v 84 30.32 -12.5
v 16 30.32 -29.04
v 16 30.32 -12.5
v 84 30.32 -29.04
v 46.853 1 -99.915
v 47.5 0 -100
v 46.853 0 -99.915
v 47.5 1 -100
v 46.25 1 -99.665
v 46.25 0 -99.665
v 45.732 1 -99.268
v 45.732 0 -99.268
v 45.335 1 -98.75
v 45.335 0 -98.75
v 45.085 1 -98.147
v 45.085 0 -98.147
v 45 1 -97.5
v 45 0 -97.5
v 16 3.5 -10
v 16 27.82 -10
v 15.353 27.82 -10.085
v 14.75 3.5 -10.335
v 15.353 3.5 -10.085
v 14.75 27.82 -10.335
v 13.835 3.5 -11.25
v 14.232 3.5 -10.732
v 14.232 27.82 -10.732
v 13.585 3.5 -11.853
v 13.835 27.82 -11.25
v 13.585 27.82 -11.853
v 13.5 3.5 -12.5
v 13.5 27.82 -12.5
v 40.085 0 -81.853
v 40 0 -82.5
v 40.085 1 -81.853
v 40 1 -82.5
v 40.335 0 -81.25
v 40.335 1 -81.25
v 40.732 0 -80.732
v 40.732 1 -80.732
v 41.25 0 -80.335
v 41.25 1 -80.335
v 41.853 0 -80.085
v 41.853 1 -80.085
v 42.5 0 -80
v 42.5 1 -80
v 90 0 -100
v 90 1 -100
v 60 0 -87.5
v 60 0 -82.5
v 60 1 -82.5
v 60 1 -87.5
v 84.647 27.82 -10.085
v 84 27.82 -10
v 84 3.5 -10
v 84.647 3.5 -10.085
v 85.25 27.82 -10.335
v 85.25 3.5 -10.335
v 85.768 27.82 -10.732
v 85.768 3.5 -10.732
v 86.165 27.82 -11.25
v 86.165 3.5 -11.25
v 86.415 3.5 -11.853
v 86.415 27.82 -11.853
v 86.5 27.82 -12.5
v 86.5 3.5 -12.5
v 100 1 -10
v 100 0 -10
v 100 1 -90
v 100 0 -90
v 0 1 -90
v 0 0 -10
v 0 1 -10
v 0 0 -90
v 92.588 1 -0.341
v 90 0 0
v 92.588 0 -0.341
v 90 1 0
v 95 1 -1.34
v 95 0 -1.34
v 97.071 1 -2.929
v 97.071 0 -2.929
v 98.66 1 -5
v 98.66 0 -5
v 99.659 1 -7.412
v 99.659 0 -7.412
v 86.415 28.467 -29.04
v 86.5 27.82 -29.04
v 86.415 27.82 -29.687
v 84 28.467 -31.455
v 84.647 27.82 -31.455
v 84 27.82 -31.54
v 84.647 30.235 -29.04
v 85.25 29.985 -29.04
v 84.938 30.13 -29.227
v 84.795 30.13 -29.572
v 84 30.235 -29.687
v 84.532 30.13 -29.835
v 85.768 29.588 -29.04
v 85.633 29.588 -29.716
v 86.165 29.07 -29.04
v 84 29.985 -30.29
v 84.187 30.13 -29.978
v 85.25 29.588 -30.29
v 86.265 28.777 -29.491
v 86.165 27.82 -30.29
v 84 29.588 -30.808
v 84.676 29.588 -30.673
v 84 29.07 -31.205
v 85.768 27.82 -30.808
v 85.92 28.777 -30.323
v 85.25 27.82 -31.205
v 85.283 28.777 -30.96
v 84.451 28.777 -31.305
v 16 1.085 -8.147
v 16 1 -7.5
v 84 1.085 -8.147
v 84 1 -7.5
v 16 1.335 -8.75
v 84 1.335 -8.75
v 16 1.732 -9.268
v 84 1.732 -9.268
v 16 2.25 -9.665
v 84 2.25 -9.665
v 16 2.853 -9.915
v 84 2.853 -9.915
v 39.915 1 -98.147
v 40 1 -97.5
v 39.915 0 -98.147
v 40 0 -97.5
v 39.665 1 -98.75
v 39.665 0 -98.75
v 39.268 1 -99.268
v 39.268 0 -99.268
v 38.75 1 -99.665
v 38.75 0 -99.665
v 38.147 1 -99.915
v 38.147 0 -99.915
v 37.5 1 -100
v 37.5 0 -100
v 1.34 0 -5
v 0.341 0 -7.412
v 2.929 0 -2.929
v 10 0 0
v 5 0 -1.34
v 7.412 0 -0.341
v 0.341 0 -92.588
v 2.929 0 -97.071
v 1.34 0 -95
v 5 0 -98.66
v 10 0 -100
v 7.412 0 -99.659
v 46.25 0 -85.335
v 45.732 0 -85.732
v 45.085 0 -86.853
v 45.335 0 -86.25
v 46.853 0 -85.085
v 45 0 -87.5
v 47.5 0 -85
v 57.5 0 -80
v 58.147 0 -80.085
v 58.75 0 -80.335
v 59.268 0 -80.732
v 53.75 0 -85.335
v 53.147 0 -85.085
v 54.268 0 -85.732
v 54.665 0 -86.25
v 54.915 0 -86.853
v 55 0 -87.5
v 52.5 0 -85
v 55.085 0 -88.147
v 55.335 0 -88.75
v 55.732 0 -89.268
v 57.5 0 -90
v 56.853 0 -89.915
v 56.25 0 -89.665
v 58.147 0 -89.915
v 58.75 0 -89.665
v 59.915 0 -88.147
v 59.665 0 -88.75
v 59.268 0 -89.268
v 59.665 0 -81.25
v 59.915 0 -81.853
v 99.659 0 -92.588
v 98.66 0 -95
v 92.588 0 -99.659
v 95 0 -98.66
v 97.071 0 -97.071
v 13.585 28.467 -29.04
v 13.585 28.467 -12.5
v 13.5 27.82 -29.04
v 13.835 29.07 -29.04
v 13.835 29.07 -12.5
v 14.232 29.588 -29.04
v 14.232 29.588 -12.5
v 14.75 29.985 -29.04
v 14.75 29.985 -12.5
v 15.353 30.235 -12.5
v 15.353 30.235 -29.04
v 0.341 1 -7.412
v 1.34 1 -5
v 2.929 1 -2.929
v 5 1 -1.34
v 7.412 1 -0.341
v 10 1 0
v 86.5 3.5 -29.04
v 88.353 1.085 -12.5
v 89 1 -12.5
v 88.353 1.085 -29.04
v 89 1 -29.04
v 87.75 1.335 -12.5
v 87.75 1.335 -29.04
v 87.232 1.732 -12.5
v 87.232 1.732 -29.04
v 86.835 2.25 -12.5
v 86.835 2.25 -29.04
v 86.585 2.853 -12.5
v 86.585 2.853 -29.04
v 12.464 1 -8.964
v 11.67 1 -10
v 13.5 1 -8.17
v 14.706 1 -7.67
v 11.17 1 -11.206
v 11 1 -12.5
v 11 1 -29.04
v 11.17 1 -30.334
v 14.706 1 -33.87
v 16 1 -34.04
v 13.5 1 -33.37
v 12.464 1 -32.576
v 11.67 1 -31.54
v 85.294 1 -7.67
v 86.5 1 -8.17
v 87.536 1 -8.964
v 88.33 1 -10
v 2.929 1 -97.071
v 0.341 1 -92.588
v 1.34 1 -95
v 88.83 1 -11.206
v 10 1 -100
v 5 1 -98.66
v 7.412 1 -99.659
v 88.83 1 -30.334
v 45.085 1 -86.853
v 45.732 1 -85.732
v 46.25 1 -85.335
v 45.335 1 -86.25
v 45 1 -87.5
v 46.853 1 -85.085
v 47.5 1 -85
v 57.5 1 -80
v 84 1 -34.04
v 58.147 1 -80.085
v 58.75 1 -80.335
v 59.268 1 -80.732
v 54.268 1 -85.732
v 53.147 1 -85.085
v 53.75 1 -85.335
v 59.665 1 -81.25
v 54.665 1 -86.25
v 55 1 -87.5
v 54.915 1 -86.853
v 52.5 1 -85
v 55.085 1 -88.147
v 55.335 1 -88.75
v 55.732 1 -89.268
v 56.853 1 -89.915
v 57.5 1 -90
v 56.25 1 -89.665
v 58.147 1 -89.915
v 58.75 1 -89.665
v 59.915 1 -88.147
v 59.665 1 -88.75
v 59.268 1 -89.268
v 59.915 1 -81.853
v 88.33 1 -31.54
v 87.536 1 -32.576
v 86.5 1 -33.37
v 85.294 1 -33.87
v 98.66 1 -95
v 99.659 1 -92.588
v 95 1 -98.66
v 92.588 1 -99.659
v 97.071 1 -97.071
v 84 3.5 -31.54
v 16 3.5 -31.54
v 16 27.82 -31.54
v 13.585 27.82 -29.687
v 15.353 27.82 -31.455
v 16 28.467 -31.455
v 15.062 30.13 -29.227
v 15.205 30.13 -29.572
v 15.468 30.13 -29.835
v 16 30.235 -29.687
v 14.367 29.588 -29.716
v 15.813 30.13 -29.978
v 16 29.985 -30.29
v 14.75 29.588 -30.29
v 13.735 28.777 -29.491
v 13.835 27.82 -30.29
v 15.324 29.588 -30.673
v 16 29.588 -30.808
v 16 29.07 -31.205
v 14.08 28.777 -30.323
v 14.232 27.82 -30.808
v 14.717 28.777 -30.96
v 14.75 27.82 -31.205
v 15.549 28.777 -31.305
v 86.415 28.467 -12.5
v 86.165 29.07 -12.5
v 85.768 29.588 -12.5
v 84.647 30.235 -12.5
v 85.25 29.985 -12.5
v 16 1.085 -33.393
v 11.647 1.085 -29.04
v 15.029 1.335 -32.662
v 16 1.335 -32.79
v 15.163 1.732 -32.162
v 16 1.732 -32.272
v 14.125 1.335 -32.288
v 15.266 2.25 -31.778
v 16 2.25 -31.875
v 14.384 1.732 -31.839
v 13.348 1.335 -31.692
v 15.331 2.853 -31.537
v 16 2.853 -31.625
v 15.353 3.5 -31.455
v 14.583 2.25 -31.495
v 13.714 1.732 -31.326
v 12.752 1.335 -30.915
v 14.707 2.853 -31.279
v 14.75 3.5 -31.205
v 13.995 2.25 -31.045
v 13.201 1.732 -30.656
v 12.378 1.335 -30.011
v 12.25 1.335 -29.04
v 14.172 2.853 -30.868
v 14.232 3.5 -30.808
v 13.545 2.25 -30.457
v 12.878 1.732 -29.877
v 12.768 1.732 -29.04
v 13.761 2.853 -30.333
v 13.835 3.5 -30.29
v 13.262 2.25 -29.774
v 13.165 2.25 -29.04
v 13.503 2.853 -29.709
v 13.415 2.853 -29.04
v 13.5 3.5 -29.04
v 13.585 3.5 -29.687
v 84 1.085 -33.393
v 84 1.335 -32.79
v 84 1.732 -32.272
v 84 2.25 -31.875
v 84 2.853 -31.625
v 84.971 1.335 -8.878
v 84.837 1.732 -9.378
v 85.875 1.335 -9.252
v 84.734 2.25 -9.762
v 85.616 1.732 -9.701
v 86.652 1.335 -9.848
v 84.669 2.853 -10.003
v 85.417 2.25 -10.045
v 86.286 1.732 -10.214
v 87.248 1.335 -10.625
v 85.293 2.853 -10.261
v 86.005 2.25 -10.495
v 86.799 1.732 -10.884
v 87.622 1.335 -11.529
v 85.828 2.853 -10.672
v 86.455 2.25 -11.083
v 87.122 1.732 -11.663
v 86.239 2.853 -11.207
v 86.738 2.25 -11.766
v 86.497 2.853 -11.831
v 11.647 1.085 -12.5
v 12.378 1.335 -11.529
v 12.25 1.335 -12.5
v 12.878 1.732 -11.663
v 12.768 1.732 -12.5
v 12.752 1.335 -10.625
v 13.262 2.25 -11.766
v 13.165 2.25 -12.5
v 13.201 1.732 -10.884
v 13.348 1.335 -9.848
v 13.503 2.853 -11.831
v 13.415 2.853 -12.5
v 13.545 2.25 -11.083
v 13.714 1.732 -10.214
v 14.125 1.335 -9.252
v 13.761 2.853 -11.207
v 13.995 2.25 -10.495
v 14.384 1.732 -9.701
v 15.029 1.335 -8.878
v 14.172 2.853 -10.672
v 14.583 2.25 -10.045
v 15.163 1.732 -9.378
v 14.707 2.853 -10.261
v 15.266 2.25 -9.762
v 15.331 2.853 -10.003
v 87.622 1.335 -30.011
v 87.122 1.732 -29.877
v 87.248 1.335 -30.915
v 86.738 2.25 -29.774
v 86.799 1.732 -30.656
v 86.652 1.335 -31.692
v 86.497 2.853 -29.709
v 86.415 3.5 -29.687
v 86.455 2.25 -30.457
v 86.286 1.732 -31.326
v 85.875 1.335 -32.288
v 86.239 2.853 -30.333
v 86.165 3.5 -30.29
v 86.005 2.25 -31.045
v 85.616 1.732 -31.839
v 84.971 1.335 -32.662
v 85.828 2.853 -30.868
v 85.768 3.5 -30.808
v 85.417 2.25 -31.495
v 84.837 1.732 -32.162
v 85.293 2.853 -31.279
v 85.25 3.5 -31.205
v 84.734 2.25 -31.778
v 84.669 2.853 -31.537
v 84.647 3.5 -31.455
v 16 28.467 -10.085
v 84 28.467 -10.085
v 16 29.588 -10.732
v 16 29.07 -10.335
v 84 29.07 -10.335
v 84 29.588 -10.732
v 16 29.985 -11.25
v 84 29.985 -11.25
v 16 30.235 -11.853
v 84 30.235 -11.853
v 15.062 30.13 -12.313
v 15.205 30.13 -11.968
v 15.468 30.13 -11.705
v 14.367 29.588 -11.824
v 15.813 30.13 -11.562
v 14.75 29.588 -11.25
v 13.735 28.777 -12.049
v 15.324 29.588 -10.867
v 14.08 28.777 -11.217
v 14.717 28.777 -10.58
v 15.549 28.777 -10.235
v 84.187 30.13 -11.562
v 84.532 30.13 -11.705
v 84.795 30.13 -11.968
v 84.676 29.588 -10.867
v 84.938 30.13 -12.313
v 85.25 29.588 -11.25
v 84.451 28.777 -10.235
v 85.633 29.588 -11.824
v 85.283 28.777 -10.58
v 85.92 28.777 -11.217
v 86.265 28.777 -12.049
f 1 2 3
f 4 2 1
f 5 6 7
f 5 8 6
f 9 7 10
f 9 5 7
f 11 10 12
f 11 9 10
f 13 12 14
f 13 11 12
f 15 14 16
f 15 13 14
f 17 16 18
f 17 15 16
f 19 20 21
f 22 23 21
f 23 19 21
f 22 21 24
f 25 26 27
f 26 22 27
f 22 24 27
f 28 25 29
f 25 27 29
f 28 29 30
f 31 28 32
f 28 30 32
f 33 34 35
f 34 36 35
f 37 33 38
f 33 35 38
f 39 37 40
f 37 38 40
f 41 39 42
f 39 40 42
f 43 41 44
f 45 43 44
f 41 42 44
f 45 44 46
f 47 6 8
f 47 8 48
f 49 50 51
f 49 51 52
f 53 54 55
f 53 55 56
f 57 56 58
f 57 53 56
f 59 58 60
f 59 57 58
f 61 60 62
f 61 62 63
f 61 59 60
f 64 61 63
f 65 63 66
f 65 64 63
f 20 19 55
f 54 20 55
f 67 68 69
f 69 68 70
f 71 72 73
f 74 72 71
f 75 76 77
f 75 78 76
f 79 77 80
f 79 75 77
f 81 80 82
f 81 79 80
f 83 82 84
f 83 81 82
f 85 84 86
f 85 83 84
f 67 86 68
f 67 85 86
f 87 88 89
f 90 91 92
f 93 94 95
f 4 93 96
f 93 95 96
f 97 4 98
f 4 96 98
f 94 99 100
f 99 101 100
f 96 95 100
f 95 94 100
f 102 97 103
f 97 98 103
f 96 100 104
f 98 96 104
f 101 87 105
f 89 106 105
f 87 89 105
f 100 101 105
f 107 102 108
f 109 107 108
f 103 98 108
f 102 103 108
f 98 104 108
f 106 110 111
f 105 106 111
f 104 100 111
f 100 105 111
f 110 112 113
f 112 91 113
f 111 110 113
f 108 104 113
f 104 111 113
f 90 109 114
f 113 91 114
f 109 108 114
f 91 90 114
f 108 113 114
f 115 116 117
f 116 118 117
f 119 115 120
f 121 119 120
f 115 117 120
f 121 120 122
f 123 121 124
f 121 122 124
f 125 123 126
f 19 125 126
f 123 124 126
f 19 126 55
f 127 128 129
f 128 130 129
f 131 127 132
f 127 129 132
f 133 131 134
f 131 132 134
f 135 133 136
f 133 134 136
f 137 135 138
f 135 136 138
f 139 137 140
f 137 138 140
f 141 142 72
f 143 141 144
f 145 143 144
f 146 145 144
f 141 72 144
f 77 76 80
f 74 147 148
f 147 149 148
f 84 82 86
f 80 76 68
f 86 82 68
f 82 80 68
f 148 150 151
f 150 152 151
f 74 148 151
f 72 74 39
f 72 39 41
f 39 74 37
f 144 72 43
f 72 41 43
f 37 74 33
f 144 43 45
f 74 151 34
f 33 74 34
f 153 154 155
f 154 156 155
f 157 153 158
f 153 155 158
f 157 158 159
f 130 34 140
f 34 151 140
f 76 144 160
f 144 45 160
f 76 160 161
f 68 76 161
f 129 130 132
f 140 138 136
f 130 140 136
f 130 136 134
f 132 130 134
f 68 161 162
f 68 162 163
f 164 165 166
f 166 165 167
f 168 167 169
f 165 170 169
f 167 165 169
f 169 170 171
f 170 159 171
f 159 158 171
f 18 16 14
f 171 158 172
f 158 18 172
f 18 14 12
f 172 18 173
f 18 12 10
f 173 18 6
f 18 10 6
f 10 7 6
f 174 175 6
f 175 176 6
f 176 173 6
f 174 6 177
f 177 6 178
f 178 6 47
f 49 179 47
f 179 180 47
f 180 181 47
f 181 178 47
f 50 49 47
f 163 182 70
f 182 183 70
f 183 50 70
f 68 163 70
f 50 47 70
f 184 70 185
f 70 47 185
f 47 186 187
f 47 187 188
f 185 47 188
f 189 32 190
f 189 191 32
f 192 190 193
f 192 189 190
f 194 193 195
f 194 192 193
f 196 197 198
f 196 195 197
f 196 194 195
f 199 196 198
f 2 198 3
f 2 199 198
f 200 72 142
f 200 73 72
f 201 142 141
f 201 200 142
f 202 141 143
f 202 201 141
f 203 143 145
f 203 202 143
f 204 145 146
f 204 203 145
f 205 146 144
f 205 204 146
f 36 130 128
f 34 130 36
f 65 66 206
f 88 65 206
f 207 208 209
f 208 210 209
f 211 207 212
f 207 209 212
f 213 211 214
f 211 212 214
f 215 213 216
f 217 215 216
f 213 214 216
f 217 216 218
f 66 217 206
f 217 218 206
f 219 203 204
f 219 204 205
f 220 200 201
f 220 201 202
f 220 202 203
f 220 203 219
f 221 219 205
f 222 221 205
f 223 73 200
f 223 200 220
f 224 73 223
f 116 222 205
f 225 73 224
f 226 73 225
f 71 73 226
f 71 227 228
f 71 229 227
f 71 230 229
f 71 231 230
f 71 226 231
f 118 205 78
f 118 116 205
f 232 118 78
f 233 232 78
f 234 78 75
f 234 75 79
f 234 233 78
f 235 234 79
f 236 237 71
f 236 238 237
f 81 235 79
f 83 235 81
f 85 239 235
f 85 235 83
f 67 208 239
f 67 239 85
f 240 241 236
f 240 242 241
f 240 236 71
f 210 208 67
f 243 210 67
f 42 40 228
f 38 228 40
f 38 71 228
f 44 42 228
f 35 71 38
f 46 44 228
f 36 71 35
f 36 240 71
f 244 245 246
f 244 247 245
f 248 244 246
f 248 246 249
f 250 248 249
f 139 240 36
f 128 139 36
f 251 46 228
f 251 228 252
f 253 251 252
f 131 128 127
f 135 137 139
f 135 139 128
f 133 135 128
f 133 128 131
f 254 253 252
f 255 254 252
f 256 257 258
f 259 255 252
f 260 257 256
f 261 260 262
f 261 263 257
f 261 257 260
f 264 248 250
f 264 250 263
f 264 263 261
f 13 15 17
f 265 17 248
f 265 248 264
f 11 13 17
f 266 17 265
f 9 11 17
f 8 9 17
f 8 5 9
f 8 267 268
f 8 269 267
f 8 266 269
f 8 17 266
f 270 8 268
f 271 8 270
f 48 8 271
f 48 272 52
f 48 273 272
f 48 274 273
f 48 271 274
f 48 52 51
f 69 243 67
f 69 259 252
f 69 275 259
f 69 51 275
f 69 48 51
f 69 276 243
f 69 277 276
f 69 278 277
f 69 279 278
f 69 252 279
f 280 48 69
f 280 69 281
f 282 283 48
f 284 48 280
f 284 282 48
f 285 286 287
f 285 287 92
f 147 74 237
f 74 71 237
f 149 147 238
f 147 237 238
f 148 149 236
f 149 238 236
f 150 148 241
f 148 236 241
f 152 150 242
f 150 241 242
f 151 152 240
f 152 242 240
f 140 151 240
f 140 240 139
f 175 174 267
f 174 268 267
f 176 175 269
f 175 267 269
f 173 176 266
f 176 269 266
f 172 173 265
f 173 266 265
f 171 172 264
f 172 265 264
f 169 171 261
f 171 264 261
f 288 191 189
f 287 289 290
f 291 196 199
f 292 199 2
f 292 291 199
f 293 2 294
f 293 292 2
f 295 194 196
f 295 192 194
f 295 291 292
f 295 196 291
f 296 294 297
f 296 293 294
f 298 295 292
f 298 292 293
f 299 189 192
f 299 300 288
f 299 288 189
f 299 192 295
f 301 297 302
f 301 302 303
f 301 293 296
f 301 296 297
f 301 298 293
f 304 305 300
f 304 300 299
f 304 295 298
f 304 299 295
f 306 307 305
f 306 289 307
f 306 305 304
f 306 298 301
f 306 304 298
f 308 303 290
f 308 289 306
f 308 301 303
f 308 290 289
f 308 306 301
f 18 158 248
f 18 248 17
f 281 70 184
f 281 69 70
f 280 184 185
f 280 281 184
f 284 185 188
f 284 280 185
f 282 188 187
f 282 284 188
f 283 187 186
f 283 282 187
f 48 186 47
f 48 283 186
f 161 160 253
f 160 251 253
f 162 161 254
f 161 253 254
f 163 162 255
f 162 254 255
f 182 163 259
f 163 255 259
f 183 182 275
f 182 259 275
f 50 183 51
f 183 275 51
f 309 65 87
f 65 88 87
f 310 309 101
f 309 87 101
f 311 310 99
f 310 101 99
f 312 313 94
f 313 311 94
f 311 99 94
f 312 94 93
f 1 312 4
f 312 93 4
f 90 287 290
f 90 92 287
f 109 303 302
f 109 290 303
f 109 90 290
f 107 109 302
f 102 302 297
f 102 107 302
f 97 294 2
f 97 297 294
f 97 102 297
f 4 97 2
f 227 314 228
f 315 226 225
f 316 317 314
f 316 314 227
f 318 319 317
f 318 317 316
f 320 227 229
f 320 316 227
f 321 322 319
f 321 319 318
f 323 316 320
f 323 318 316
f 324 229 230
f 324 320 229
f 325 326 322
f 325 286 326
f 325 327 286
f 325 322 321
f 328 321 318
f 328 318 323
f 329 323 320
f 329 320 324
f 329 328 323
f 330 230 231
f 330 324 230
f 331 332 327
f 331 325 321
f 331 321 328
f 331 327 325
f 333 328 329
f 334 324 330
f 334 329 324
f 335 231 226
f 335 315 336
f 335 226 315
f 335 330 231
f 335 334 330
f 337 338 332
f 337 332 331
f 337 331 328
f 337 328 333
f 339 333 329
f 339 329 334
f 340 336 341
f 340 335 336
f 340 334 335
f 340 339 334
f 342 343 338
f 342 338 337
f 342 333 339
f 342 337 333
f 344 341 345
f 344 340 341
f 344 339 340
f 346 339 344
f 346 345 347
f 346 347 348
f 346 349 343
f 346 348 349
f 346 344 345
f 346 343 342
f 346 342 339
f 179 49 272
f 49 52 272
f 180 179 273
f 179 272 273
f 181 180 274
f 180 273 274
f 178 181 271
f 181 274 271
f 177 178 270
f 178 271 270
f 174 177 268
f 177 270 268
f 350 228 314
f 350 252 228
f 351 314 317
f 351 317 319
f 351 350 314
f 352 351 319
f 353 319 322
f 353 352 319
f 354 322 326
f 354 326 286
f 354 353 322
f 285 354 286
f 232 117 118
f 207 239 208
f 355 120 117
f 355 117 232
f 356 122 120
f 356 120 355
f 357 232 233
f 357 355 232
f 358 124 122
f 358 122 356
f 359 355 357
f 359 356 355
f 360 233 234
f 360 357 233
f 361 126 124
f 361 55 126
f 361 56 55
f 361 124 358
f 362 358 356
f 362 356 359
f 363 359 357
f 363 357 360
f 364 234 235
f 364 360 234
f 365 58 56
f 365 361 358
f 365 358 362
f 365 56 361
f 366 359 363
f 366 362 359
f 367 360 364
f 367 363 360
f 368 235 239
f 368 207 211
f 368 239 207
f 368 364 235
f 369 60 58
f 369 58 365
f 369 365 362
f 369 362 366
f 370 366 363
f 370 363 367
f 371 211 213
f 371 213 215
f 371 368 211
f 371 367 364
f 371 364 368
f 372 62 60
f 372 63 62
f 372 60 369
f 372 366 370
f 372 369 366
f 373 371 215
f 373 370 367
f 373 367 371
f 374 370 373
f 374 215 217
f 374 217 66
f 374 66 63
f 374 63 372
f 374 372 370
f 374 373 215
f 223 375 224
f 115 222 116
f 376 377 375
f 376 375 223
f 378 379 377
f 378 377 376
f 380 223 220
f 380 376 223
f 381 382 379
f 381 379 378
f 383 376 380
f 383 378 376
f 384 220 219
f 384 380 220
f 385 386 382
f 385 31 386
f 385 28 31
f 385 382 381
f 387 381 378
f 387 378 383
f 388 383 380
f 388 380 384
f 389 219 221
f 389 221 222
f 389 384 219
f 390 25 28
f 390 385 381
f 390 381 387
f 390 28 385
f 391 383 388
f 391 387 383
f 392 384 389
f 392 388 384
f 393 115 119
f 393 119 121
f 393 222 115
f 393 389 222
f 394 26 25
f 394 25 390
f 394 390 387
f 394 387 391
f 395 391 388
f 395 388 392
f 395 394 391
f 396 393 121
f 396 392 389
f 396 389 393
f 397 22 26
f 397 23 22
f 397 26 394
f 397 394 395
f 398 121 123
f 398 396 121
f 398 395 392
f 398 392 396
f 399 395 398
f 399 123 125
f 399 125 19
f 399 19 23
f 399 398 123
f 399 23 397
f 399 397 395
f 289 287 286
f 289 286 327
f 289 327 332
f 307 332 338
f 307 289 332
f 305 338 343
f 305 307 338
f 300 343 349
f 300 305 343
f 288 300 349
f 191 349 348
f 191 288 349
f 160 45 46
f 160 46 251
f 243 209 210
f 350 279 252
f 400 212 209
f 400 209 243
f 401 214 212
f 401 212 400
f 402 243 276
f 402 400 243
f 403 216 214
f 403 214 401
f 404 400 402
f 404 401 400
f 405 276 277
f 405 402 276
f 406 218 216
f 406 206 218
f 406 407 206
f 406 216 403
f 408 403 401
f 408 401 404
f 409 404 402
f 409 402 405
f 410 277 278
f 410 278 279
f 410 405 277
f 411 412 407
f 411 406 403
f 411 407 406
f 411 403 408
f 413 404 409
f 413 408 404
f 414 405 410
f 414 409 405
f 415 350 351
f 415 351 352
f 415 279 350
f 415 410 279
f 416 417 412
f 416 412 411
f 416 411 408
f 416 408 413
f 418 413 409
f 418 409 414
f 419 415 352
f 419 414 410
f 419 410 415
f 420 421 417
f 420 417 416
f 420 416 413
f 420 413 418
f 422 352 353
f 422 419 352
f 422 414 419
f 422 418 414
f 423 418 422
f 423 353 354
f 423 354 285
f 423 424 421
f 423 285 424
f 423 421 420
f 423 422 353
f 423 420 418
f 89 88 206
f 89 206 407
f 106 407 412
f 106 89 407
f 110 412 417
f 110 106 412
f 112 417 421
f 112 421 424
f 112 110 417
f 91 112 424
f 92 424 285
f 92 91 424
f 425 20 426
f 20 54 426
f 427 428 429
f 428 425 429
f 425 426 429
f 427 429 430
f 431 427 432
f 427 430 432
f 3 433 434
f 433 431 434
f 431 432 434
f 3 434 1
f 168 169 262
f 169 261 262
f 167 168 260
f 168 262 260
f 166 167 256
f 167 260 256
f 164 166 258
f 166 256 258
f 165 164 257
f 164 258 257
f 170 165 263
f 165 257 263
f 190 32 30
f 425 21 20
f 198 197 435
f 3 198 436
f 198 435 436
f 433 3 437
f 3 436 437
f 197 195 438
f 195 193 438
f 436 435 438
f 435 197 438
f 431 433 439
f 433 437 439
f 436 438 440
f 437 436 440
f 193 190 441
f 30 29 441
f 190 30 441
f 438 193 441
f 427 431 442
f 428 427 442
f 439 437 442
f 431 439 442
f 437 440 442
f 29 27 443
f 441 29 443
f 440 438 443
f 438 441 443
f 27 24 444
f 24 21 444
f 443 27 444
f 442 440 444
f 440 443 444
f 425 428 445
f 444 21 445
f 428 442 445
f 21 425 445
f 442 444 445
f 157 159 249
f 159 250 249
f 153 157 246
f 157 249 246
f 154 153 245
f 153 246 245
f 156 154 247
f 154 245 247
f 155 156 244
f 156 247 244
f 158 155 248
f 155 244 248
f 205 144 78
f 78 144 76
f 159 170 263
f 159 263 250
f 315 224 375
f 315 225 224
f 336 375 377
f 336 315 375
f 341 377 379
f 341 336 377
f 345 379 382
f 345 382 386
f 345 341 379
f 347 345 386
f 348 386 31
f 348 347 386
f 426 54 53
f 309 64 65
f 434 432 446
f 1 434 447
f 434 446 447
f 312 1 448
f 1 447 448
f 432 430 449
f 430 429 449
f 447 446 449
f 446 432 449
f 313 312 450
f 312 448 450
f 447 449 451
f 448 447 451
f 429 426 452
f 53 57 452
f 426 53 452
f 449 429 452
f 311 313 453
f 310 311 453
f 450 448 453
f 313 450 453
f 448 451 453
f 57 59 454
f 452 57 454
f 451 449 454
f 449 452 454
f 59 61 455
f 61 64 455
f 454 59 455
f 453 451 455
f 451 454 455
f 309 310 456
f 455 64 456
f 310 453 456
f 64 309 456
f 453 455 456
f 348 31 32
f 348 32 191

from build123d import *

# Parameters (mm, degrees)
SKETCH2_W               = 100
SKETCH2_H               = 100
BOSS_EXTRUDE1_DEPTH     = 1
FILLET1_R               = 10
CUT_EXTRUDE1_DEPTH      = 142.424891727
CUT_EXTRUDE1_DEPTH_BACK = 142.424891727
FILLET2_R               = 2.5
SKETCH4_W               = 73
SKETCH4_H               = 21.54
BOSS_EXTRUDE2_DEPTH     = 29.32
FILLET3_R               = 2.5


with BuildPart() as part:
    # Sketch2 → Boss-Extrude1 (new body)
    with BuildSketch(Plane(origin=(0, 0, 0), x_dir=(1, 0, 0), z_dir=(0, 1, 0))):
        with Locations((50, 50)):
            Rectangle(SKETCH2_W, SKETCH2_H)
    extrude(amount=BOSS_EXTRUDE1_DEPTH)

    # Fillet1
    fillet1_edges = [part.edges().sort_by_distance(p)[0] for p in [
        (0, 0.5, -100),
        (100, 0.5, -100),
        (100, 0.5, 0),
        (0, 0.5, 0),
    ]]
    fillet(fillet1_edges, radius=FILLET1_R)

    # Sketch3 → Cut-Extrude1 (cut, two sides: drawn at the far end of the back side and taken through both)
    with BuildSketch(Plane(origin=(0, 1, 0), x_dir=(1, 0, 0), z_dir=(0, 1, 0)).offset(-CUT_EXTRUDE1_DEPTH_BACK)):
        Polygon((40, 343.238075794), (40, 100), (40, 80), (60, 80), (60, 90), (55, 90), (55, 85), (45, 85), (45, 100), (45, 343.238075794), (45, 829.714227381), (40, 829.714227381), align=None)
    extrude(amount=CUT_EXTRUDE1_DEPTH + CUT_EXTRUDE1_DEPTH_BACK, mode=Mode.SUBTRACT)

    # Fillet2
    fillet2_edges = [part.edges().sort_by_distance(p)[0] for p in [
        (60, 0.5, -80),
        (60, 0.5, -90),
        (55, 0.5, -90),
        (40, 0.5, -80),
    ]]
    fillet(fillet2_edges, radius=FILLET2_R - 0.0001)  # a hair under: the kernel refuses the full size
    fillet2_2_edges = [part.edges().sort_by_distance(p)[0] for p in [
        (45, 0.5, -100),
        (40, 0.5, -100),
        (55, 0.5, -85),
        (45, 0.5, -85),
    ]]
    fillet(fillet2_2_edges, radius=FILLET2_R)

    # Sketch4 → Boss-Extrude2 (add)
    with BuildSketch(Plane(origin=(0, 1, 0), x_dir=(1, 0, 0), z_dir=(0, 1, 0))):
        with Locations((50, 20.77)):
            Rectangle(SKETCH4_W, SKETCH4_H)
    extrude(amount=BOSS_EXTRUDE2_DEPTH)

    # Fillet3
    fillet3_edges = [part.edges().sort_by_distance(p)[0] for p in [
        (13.5, 1, -20.77),
        (13.5, 15.66, -31.54),
        (50, 1, -10),
        (13.5, 15.66, -10),
        (86.5, 1, -20.77),
        (86.5, 15.66, -10),
        (50, 1, -31.54),
        (86.5, 15.66, -31.54),
        (13.5, 30.32, -20.77),
        (50, 30.32, -10),
        (86.5, 30.32, -20.77),
        (50, 30.32, -31.54),
    ]]
    fillet(fillet3_edges, radius=FILLET3_R)


solid = part.part
